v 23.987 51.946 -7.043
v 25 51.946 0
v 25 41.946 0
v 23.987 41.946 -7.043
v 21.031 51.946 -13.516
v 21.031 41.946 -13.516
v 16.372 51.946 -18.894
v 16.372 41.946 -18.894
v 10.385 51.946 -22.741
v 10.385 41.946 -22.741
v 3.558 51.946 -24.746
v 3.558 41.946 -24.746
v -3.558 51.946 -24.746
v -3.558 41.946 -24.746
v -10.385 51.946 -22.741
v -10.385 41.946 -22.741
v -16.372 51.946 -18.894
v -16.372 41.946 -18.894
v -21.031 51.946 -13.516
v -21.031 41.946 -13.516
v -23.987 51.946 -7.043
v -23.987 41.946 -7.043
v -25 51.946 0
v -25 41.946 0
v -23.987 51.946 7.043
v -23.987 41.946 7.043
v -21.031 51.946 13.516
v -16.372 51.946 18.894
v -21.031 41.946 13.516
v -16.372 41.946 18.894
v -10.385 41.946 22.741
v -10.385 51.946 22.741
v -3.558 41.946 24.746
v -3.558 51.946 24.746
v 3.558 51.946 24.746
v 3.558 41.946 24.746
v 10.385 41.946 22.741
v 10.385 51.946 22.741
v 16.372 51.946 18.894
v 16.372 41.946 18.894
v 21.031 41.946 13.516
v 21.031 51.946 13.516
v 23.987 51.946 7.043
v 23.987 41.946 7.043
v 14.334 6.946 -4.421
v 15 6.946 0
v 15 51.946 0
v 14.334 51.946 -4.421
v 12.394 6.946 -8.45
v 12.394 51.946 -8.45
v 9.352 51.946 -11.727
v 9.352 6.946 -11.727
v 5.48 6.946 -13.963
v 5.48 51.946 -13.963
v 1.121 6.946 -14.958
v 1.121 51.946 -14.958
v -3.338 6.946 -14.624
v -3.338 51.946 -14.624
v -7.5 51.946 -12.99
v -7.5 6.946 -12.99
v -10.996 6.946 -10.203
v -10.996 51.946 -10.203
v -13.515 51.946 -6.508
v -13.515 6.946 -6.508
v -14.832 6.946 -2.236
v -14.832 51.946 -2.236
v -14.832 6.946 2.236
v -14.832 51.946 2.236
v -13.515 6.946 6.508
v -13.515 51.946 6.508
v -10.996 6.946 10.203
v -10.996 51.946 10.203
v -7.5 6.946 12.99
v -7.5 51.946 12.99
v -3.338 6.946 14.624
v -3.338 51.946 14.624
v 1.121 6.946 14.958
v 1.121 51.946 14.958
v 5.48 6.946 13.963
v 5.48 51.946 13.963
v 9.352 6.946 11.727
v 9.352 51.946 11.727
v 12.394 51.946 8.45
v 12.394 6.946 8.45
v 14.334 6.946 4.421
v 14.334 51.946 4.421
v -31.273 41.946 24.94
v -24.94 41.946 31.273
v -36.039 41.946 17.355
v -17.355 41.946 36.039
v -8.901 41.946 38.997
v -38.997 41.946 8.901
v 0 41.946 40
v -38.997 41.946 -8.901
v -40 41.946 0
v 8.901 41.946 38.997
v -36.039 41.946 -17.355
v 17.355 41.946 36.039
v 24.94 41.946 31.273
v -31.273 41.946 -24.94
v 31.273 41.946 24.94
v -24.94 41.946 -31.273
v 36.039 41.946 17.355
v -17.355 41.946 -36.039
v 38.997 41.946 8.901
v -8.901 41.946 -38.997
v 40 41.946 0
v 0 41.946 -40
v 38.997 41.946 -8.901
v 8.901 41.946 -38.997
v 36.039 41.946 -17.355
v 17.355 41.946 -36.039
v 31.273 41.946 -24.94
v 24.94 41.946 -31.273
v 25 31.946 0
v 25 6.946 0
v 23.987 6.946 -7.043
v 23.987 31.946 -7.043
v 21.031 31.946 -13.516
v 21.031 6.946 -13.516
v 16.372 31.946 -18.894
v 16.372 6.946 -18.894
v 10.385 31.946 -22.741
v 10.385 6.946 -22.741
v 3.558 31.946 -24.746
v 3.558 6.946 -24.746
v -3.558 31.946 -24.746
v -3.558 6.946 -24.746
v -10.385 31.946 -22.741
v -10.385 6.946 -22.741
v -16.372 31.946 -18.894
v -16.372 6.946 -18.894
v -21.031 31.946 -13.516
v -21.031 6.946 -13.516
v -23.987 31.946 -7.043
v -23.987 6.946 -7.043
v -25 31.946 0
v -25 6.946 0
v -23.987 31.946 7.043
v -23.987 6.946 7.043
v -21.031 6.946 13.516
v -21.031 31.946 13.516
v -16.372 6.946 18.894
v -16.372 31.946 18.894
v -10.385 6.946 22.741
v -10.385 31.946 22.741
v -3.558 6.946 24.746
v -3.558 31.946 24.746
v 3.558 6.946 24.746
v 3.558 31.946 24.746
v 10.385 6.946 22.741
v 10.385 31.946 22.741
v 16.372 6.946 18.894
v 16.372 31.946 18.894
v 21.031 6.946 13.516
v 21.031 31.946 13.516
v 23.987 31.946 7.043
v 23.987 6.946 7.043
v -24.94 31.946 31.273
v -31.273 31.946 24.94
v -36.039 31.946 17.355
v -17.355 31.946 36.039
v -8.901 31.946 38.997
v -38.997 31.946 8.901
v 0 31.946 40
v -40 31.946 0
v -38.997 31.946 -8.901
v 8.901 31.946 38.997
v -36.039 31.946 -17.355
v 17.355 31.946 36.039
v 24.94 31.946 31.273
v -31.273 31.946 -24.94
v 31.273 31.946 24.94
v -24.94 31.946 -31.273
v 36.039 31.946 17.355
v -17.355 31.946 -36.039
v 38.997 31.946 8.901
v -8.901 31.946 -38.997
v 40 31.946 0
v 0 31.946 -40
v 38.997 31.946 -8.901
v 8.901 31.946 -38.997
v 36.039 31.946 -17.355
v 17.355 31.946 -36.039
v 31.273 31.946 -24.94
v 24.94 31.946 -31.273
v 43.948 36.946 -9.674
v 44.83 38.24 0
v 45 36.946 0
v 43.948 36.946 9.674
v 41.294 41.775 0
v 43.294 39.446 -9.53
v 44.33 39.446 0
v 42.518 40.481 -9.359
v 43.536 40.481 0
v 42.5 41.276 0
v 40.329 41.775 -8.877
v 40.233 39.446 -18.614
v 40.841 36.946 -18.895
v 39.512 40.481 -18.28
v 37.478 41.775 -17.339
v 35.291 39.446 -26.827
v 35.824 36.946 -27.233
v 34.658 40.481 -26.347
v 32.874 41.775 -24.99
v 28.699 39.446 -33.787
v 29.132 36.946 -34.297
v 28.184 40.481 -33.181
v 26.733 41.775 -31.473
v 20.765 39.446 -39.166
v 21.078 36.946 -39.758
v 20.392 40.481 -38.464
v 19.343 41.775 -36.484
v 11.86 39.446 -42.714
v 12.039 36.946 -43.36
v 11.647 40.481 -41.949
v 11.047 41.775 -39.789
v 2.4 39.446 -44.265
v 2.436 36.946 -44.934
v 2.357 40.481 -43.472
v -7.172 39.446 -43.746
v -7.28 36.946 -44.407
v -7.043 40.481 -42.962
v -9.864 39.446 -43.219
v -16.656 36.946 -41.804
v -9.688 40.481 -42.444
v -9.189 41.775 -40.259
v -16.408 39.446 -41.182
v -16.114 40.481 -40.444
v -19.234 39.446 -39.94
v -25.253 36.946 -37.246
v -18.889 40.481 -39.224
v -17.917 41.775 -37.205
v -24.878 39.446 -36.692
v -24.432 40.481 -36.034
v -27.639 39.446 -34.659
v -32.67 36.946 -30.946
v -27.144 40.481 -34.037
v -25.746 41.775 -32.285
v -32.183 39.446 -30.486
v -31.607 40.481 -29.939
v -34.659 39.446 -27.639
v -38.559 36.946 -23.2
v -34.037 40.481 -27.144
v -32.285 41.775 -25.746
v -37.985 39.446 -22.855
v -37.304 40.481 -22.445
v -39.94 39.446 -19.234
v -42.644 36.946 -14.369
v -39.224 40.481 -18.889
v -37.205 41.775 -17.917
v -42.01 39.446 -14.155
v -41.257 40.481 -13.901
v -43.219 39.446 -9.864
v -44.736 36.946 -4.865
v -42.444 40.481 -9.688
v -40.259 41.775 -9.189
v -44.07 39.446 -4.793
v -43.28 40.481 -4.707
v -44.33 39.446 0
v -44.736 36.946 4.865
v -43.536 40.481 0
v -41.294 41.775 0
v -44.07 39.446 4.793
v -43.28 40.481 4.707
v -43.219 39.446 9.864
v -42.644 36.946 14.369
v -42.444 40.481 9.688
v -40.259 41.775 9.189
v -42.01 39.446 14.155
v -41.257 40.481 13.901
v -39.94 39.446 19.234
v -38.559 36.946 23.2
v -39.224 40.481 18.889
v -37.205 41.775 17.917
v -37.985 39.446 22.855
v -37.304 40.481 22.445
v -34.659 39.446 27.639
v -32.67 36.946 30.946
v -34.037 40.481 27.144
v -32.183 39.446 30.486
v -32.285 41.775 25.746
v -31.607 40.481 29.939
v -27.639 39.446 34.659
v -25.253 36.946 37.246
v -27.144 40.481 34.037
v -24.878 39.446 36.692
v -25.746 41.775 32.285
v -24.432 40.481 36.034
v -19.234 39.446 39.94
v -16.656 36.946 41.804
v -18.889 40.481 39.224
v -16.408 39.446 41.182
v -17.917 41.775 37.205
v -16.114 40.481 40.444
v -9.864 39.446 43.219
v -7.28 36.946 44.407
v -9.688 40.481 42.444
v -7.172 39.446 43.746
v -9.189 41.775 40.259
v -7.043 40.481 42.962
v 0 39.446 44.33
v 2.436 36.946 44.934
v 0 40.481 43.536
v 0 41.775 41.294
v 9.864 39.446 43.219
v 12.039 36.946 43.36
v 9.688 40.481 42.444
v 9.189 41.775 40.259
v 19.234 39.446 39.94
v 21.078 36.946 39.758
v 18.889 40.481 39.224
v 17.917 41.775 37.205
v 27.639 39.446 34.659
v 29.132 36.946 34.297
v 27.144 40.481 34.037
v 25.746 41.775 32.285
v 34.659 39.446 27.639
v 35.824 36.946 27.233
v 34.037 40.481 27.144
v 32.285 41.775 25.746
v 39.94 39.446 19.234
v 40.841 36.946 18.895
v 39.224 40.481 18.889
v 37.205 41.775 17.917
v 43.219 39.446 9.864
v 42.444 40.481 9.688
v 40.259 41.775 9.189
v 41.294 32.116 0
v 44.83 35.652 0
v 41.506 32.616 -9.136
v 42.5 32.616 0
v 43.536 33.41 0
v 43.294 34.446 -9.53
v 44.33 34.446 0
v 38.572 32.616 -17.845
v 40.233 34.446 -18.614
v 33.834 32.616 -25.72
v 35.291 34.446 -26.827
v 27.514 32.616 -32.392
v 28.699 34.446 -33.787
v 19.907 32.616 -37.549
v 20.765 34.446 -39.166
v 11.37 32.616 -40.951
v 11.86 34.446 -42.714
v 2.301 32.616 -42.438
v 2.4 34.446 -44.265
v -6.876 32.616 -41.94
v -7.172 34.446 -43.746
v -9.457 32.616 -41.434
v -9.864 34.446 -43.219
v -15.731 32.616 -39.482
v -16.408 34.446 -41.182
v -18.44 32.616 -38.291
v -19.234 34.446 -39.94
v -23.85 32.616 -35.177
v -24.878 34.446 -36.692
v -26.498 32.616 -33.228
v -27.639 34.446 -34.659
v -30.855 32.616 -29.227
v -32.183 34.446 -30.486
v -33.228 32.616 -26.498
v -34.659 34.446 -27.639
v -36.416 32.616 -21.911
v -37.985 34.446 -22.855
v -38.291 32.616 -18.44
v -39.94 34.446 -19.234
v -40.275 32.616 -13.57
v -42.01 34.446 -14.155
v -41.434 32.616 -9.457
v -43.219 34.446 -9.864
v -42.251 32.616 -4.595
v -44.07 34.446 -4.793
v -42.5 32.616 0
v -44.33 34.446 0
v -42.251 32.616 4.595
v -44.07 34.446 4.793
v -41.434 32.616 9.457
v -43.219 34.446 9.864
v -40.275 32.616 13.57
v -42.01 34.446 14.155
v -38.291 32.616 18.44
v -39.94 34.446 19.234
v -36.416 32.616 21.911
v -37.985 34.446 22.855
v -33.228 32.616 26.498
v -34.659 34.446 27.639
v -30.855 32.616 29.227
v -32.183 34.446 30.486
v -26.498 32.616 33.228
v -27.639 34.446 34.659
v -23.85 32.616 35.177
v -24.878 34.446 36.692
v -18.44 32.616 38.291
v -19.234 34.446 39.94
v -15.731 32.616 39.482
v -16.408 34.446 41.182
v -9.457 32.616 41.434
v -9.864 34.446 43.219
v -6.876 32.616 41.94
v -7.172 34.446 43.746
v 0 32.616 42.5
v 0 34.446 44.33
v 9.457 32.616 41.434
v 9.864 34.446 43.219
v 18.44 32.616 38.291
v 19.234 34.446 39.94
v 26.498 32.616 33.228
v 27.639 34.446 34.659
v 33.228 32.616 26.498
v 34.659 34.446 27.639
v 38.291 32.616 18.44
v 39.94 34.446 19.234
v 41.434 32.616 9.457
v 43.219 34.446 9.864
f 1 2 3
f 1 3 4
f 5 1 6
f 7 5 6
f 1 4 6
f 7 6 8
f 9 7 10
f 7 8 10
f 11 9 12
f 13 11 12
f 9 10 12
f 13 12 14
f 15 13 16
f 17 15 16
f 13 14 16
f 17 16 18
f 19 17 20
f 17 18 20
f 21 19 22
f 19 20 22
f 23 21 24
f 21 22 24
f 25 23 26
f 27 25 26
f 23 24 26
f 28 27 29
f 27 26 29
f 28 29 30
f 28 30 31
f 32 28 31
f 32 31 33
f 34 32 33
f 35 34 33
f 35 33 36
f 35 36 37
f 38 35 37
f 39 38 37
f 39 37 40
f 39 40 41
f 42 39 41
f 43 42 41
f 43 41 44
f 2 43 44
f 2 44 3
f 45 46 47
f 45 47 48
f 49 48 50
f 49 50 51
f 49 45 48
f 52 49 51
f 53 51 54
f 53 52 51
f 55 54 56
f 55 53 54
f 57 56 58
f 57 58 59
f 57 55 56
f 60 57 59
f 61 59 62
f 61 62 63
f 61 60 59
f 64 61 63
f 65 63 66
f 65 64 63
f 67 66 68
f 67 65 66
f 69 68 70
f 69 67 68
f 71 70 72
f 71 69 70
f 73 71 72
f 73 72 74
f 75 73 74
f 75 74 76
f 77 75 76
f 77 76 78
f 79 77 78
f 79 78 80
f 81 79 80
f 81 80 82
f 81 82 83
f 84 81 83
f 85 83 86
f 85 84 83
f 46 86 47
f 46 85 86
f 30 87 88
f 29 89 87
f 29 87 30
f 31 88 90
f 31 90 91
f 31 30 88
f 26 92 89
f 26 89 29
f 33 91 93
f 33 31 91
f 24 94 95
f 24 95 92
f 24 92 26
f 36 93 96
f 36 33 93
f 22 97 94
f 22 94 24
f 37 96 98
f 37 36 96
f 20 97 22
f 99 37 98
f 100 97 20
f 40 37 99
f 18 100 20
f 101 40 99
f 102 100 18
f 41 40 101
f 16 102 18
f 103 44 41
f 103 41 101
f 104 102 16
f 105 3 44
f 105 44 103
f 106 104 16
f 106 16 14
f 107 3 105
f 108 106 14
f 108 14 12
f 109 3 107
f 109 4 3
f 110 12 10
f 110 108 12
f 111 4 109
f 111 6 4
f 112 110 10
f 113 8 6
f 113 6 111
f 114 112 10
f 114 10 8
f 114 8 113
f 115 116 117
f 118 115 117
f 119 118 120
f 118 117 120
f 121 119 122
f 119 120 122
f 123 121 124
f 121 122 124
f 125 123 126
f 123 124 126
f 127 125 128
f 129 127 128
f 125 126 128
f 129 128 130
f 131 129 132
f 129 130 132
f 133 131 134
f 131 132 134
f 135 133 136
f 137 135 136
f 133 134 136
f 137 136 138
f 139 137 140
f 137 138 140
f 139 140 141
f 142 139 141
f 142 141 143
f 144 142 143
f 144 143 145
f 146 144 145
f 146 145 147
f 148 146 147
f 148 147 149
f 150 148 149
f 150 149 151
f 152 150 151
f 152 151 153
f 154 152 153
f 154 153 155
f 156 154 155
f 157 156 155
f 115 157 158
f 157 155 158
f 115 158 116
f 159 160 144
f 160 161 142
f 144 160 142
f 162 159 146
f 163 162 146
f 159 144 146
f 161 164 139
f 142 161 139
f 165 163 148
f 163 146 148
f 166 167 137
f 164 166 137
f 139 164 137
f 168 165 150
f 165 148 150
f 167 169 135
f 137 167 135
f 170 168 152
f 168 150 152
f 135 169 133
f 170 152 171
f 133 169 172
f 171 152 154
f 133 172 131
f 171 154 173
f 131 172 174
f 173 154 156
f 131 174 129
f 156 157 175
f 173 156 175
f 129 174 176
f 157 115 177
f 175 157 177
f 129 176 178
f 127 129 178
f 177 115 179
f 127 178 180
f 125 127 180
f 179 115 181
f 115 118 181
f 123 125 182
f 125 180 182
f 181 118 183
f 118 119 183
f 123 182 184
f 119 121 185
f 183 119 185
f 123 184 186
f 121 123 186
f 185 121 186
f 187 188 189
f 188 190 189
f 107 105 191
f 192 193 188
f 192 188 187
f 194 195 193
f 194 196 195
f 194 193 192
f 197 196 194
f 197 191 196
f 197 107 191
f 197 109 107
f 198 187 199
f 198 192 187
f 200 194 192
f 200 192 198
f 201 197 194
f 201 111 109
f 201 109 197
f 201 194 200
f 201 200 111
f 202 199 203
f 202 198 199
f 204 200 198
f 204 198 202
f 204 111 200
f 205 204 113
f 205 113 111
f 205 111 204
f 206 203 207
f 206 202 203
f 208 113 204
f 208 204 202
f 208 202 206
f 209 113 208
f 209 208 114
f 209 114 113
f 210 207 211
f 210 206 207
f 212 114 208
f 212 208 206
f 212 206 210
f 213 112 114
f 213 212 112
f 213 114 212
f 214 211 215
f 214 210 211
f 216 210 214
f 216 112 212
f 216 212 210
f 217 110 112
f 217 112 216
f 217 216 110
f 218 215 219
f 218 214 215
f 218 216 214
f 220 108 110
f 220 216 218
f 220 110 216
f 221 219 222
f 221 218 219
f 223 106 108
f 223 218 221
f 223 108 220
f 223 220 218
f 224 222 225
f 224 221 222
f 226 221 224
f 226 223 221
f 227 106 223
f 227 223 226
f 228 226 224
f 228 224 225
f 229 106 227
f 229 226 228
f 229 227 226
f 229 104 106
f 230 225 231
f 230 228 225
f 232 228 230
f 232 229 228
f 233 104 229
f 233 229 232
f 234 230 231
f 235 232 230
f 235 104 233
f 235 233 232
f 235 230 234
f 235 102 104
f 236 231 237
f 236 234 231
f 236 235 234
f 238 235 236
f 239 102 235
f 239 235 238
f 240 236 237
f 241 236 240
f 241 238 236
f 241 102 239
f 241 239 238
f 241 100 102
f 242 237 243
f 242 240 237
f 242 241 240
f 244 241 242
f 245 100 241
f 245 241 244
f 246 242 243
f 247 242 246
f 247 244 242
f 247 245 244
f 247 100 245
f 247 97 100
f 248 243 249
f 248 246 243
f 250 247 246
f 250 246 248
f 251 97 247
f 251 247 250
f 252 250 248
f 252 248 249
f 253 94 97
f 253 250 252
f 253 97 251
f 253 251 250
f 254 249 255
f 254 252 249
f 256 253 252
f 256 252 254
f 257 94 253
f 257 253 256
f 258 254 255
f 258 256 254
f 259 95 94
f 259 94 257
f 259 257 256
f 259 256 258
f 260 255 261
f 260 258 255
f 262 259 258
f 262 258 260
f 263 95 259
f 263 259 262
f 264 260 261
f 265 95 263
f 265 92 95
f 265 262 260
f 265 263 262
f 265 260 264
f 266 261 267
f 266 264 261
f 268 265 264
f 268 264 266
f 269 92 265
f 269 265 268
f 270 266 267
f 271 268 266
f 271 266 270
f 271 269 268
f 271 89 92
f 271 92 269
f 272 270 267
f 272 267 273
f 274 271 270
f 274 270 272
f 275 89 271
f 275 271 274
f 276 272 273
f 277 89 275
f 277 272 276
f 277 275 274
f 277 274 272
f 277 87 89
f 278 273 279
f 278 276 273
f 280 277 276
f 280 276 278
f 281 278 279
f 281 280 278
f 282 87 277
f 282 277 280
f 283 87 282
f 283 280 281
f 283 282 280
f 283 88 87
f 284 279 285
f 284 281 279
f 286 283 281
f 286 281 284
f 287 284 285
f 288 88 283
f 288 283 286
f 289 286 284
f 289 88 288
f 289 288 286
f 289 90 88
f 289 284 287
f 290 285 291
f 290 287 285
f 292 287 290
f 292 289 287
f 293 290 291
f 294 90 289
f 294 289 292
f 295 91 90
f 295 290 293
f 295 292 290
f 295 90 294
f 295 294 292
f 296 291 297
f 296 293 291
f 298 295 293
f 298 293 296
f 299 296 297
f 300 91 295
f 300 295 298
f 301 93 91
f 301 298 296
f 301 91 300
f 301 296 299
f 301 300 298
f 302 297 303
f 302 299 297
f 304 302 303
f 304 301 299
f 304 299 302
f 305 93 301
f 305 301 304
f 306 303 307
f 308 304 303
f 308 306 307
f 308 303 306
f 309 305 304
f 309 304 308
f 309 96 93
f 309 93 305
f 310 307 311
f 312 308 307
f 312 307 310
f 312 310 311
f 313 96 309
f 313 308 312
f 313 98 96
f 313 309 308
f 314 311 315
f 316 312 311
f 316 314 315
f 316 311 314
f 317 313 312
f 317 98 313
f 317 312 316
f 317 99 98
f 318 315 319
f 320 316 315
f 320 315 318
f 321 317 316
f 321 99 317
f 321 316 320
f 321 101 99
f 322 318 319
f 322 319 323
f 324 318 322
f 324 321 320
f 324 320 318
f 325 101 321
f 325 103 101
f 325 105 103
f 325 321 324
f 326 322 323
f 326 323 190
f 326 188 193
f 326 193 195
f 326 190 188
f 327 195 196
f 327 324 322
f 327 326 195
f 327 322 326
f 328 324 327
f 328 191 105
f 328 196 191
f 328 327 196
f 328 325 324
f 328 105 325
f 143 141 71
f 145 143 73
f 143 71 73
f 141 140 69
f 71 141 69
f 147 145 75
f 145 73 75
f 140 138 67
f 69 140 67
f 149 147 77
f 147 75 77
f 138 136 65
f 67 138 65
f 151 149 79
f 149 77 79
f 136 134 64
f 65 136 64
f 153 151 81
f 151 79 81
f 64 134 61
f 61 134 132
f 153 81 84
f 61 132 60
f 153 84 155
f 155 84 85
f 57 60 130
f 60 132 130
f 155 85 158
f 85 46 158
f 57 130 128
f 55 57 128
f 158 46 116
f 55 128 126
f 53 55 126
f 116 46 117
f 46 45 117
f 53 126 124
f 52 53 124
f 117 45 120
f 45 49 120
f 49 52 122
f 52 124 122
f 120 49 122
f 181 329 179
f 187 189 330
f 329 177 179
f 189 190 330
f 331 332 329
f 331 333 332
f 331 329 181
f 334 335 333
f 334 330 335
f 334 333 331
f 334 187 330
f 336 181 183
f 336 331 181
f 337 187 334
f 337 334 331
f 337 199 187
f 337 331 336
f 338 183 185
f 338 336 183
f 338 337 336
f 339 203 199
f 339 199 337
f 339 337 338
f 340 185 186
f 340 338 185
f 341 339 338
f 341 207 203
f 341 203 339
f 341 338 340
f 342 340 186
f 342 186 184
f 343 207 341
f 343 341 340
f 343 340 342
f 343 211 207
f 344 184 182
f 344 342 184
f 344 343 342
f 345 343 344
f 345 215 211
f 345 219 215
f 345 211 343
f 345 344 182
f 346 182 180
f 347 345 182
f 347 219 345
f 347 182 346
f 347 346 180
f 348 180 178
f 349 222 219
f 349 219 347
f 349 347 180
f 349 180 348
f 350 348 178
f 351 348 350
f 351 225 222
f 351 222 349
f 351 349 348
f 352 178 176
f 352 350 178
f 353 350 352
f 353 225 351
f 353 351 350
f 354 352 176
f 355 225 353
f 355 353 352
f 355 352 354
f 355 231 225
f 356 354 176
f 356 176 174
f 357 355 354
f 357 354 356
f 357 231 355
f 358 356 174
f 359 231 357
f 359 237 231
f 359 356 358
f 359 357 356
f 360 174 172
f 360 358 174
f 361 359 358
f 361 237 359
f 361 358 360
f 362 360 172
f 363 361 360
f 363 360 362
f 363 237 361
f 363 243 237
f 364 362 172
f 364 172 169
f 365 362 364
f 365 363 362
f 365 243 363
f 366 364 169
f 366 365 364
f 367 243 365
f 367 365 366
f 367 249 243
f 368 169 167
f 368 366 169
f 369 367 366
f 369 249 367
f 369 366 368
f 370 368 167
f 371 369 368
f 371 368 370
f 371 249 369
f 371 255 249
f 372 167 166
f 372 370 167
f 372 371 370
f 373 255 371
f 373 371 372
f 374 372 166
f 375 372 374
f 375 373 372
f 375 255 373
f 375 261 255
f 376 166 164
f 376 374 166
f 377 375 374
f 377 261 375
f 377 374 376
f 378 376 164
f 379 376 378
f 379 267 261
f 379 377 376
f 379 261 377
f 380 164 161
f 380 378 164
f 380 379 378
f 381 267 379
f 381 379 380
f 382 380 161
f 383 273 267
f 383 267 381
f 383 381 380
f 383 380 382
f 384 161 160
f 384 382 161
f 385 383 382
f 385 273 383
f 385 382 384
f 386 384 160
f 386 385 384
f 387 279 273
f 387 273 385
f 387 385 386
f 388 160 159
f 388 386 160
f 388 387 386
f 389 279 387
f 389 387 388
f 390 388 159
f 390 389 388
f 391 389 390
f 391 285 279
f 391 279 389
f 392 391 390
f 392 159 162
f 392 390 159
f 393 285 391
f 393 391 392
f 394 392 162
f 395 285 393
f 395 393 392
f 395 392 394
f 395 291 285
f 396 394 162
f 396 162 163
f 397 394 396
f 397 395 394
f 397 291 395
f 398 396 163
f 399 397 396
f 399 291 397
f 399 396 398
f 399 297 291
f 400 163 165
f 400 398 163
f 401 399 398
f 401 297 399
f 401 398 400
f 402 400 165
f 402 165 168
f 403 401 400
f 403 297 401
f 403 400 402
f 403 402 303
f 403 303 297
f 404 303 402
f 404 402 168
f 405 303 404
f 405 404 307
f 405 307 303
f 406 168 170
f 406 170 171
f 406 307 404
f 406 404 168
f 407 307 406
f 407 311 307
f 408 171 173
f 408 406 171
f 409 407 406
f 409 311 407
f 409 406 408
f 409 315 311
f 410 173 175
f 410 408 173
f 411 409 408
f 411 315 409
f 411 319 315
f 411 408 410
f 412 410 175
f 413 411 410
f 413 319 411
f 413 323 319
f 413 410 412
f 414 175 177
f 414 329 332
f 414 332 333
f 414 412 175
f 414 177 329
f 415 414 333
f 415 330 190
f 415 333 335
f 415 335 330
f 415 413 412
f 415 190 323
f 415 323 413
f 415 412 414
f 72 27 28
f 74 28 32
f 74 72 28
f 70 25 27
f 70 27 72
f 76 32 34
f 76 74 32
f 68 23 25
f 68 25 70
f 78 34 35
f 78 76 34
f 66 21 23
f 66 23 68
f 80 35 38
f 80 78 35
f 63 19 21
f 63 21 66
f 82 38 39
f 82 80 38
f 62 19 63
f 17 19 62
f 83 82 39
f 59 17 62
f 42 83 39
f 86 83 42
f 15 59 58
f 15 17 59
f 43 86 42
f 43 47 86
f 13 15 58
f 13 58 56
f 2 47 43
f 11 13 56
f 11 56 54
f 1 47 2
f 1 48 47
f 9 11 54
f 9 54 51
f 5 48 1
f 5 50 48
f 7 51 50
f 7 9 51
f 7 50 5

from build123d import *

# Parameters (mm, degrees)
REVOLVE_THIN2_START         = 6.945845758
REVOLVE_THIN2_OUTLINE_R     = 25
REVOLVE_THIN2_OUTLINE_R_2   = 15
REVOLVE_THIN2_DEPTH         = 45
REVOLVE_THIN2_START_2       = 31.945845758
REVOLVE_THIN2_2_OUTLINE_R   = 45
REVOLVE_THIN2_2_OUTLINE_R_2 = 25
REVOLVE_THIN2_2_DEPTH       = 10
FILLET4_R                   = 5


# Read off the part's stored shape, not the designer's step: Revolve-Thin2
with BuildPart() as part:
    # Revolve-Thin2 outline → Revolve-Thin2 (new body)
    with BuildSketch(Plane(origin=(0, 0, 0), x_dir=(1, 0, 0), z_dir=(0, 1, 0)).offset(REVOLVE_THIN2_START)):
        Circle(REVOLVE_THIN2_OUTLINE_R)
        Circle(REVOLVE_THIN2_OUTLINE_R_2, mode=Mode.SUBTRACT)
    extrude(amount=REVOLVE_THIN2_DEPTH)

    # Revolve-Thin2 2 outline → Revolve-Thin2 2 (add)
    with BuildSketch(Plane(origin=(0, 0, 0), x_dir=(1, 0, 0), z_dir=(0, 1, 0)).offset(REVOLVE_THIN2_START_2)):
        Circle(REVOLVE_THIN2_2_OUTLINE_R)
        Circle(REVOLVE_THIN2_2_OUTLINE_R_2, mode=Mode.SUBTRACT)
    extrude(amount=REVOLVE_THIN2_2_DEPTH)

    # Fillet4
    fillet4_edges = [part.edges().sort_by_distance(p)[0] for p in [
        (-45, 41.945845758, 0),
        (-45, 31.945845758, 0),
    ]]
    fillet(fillet4_edges, radius=FILLET4_R - 0.0001)  # a hair under: the kernel refuses the full size


solid = part.part
